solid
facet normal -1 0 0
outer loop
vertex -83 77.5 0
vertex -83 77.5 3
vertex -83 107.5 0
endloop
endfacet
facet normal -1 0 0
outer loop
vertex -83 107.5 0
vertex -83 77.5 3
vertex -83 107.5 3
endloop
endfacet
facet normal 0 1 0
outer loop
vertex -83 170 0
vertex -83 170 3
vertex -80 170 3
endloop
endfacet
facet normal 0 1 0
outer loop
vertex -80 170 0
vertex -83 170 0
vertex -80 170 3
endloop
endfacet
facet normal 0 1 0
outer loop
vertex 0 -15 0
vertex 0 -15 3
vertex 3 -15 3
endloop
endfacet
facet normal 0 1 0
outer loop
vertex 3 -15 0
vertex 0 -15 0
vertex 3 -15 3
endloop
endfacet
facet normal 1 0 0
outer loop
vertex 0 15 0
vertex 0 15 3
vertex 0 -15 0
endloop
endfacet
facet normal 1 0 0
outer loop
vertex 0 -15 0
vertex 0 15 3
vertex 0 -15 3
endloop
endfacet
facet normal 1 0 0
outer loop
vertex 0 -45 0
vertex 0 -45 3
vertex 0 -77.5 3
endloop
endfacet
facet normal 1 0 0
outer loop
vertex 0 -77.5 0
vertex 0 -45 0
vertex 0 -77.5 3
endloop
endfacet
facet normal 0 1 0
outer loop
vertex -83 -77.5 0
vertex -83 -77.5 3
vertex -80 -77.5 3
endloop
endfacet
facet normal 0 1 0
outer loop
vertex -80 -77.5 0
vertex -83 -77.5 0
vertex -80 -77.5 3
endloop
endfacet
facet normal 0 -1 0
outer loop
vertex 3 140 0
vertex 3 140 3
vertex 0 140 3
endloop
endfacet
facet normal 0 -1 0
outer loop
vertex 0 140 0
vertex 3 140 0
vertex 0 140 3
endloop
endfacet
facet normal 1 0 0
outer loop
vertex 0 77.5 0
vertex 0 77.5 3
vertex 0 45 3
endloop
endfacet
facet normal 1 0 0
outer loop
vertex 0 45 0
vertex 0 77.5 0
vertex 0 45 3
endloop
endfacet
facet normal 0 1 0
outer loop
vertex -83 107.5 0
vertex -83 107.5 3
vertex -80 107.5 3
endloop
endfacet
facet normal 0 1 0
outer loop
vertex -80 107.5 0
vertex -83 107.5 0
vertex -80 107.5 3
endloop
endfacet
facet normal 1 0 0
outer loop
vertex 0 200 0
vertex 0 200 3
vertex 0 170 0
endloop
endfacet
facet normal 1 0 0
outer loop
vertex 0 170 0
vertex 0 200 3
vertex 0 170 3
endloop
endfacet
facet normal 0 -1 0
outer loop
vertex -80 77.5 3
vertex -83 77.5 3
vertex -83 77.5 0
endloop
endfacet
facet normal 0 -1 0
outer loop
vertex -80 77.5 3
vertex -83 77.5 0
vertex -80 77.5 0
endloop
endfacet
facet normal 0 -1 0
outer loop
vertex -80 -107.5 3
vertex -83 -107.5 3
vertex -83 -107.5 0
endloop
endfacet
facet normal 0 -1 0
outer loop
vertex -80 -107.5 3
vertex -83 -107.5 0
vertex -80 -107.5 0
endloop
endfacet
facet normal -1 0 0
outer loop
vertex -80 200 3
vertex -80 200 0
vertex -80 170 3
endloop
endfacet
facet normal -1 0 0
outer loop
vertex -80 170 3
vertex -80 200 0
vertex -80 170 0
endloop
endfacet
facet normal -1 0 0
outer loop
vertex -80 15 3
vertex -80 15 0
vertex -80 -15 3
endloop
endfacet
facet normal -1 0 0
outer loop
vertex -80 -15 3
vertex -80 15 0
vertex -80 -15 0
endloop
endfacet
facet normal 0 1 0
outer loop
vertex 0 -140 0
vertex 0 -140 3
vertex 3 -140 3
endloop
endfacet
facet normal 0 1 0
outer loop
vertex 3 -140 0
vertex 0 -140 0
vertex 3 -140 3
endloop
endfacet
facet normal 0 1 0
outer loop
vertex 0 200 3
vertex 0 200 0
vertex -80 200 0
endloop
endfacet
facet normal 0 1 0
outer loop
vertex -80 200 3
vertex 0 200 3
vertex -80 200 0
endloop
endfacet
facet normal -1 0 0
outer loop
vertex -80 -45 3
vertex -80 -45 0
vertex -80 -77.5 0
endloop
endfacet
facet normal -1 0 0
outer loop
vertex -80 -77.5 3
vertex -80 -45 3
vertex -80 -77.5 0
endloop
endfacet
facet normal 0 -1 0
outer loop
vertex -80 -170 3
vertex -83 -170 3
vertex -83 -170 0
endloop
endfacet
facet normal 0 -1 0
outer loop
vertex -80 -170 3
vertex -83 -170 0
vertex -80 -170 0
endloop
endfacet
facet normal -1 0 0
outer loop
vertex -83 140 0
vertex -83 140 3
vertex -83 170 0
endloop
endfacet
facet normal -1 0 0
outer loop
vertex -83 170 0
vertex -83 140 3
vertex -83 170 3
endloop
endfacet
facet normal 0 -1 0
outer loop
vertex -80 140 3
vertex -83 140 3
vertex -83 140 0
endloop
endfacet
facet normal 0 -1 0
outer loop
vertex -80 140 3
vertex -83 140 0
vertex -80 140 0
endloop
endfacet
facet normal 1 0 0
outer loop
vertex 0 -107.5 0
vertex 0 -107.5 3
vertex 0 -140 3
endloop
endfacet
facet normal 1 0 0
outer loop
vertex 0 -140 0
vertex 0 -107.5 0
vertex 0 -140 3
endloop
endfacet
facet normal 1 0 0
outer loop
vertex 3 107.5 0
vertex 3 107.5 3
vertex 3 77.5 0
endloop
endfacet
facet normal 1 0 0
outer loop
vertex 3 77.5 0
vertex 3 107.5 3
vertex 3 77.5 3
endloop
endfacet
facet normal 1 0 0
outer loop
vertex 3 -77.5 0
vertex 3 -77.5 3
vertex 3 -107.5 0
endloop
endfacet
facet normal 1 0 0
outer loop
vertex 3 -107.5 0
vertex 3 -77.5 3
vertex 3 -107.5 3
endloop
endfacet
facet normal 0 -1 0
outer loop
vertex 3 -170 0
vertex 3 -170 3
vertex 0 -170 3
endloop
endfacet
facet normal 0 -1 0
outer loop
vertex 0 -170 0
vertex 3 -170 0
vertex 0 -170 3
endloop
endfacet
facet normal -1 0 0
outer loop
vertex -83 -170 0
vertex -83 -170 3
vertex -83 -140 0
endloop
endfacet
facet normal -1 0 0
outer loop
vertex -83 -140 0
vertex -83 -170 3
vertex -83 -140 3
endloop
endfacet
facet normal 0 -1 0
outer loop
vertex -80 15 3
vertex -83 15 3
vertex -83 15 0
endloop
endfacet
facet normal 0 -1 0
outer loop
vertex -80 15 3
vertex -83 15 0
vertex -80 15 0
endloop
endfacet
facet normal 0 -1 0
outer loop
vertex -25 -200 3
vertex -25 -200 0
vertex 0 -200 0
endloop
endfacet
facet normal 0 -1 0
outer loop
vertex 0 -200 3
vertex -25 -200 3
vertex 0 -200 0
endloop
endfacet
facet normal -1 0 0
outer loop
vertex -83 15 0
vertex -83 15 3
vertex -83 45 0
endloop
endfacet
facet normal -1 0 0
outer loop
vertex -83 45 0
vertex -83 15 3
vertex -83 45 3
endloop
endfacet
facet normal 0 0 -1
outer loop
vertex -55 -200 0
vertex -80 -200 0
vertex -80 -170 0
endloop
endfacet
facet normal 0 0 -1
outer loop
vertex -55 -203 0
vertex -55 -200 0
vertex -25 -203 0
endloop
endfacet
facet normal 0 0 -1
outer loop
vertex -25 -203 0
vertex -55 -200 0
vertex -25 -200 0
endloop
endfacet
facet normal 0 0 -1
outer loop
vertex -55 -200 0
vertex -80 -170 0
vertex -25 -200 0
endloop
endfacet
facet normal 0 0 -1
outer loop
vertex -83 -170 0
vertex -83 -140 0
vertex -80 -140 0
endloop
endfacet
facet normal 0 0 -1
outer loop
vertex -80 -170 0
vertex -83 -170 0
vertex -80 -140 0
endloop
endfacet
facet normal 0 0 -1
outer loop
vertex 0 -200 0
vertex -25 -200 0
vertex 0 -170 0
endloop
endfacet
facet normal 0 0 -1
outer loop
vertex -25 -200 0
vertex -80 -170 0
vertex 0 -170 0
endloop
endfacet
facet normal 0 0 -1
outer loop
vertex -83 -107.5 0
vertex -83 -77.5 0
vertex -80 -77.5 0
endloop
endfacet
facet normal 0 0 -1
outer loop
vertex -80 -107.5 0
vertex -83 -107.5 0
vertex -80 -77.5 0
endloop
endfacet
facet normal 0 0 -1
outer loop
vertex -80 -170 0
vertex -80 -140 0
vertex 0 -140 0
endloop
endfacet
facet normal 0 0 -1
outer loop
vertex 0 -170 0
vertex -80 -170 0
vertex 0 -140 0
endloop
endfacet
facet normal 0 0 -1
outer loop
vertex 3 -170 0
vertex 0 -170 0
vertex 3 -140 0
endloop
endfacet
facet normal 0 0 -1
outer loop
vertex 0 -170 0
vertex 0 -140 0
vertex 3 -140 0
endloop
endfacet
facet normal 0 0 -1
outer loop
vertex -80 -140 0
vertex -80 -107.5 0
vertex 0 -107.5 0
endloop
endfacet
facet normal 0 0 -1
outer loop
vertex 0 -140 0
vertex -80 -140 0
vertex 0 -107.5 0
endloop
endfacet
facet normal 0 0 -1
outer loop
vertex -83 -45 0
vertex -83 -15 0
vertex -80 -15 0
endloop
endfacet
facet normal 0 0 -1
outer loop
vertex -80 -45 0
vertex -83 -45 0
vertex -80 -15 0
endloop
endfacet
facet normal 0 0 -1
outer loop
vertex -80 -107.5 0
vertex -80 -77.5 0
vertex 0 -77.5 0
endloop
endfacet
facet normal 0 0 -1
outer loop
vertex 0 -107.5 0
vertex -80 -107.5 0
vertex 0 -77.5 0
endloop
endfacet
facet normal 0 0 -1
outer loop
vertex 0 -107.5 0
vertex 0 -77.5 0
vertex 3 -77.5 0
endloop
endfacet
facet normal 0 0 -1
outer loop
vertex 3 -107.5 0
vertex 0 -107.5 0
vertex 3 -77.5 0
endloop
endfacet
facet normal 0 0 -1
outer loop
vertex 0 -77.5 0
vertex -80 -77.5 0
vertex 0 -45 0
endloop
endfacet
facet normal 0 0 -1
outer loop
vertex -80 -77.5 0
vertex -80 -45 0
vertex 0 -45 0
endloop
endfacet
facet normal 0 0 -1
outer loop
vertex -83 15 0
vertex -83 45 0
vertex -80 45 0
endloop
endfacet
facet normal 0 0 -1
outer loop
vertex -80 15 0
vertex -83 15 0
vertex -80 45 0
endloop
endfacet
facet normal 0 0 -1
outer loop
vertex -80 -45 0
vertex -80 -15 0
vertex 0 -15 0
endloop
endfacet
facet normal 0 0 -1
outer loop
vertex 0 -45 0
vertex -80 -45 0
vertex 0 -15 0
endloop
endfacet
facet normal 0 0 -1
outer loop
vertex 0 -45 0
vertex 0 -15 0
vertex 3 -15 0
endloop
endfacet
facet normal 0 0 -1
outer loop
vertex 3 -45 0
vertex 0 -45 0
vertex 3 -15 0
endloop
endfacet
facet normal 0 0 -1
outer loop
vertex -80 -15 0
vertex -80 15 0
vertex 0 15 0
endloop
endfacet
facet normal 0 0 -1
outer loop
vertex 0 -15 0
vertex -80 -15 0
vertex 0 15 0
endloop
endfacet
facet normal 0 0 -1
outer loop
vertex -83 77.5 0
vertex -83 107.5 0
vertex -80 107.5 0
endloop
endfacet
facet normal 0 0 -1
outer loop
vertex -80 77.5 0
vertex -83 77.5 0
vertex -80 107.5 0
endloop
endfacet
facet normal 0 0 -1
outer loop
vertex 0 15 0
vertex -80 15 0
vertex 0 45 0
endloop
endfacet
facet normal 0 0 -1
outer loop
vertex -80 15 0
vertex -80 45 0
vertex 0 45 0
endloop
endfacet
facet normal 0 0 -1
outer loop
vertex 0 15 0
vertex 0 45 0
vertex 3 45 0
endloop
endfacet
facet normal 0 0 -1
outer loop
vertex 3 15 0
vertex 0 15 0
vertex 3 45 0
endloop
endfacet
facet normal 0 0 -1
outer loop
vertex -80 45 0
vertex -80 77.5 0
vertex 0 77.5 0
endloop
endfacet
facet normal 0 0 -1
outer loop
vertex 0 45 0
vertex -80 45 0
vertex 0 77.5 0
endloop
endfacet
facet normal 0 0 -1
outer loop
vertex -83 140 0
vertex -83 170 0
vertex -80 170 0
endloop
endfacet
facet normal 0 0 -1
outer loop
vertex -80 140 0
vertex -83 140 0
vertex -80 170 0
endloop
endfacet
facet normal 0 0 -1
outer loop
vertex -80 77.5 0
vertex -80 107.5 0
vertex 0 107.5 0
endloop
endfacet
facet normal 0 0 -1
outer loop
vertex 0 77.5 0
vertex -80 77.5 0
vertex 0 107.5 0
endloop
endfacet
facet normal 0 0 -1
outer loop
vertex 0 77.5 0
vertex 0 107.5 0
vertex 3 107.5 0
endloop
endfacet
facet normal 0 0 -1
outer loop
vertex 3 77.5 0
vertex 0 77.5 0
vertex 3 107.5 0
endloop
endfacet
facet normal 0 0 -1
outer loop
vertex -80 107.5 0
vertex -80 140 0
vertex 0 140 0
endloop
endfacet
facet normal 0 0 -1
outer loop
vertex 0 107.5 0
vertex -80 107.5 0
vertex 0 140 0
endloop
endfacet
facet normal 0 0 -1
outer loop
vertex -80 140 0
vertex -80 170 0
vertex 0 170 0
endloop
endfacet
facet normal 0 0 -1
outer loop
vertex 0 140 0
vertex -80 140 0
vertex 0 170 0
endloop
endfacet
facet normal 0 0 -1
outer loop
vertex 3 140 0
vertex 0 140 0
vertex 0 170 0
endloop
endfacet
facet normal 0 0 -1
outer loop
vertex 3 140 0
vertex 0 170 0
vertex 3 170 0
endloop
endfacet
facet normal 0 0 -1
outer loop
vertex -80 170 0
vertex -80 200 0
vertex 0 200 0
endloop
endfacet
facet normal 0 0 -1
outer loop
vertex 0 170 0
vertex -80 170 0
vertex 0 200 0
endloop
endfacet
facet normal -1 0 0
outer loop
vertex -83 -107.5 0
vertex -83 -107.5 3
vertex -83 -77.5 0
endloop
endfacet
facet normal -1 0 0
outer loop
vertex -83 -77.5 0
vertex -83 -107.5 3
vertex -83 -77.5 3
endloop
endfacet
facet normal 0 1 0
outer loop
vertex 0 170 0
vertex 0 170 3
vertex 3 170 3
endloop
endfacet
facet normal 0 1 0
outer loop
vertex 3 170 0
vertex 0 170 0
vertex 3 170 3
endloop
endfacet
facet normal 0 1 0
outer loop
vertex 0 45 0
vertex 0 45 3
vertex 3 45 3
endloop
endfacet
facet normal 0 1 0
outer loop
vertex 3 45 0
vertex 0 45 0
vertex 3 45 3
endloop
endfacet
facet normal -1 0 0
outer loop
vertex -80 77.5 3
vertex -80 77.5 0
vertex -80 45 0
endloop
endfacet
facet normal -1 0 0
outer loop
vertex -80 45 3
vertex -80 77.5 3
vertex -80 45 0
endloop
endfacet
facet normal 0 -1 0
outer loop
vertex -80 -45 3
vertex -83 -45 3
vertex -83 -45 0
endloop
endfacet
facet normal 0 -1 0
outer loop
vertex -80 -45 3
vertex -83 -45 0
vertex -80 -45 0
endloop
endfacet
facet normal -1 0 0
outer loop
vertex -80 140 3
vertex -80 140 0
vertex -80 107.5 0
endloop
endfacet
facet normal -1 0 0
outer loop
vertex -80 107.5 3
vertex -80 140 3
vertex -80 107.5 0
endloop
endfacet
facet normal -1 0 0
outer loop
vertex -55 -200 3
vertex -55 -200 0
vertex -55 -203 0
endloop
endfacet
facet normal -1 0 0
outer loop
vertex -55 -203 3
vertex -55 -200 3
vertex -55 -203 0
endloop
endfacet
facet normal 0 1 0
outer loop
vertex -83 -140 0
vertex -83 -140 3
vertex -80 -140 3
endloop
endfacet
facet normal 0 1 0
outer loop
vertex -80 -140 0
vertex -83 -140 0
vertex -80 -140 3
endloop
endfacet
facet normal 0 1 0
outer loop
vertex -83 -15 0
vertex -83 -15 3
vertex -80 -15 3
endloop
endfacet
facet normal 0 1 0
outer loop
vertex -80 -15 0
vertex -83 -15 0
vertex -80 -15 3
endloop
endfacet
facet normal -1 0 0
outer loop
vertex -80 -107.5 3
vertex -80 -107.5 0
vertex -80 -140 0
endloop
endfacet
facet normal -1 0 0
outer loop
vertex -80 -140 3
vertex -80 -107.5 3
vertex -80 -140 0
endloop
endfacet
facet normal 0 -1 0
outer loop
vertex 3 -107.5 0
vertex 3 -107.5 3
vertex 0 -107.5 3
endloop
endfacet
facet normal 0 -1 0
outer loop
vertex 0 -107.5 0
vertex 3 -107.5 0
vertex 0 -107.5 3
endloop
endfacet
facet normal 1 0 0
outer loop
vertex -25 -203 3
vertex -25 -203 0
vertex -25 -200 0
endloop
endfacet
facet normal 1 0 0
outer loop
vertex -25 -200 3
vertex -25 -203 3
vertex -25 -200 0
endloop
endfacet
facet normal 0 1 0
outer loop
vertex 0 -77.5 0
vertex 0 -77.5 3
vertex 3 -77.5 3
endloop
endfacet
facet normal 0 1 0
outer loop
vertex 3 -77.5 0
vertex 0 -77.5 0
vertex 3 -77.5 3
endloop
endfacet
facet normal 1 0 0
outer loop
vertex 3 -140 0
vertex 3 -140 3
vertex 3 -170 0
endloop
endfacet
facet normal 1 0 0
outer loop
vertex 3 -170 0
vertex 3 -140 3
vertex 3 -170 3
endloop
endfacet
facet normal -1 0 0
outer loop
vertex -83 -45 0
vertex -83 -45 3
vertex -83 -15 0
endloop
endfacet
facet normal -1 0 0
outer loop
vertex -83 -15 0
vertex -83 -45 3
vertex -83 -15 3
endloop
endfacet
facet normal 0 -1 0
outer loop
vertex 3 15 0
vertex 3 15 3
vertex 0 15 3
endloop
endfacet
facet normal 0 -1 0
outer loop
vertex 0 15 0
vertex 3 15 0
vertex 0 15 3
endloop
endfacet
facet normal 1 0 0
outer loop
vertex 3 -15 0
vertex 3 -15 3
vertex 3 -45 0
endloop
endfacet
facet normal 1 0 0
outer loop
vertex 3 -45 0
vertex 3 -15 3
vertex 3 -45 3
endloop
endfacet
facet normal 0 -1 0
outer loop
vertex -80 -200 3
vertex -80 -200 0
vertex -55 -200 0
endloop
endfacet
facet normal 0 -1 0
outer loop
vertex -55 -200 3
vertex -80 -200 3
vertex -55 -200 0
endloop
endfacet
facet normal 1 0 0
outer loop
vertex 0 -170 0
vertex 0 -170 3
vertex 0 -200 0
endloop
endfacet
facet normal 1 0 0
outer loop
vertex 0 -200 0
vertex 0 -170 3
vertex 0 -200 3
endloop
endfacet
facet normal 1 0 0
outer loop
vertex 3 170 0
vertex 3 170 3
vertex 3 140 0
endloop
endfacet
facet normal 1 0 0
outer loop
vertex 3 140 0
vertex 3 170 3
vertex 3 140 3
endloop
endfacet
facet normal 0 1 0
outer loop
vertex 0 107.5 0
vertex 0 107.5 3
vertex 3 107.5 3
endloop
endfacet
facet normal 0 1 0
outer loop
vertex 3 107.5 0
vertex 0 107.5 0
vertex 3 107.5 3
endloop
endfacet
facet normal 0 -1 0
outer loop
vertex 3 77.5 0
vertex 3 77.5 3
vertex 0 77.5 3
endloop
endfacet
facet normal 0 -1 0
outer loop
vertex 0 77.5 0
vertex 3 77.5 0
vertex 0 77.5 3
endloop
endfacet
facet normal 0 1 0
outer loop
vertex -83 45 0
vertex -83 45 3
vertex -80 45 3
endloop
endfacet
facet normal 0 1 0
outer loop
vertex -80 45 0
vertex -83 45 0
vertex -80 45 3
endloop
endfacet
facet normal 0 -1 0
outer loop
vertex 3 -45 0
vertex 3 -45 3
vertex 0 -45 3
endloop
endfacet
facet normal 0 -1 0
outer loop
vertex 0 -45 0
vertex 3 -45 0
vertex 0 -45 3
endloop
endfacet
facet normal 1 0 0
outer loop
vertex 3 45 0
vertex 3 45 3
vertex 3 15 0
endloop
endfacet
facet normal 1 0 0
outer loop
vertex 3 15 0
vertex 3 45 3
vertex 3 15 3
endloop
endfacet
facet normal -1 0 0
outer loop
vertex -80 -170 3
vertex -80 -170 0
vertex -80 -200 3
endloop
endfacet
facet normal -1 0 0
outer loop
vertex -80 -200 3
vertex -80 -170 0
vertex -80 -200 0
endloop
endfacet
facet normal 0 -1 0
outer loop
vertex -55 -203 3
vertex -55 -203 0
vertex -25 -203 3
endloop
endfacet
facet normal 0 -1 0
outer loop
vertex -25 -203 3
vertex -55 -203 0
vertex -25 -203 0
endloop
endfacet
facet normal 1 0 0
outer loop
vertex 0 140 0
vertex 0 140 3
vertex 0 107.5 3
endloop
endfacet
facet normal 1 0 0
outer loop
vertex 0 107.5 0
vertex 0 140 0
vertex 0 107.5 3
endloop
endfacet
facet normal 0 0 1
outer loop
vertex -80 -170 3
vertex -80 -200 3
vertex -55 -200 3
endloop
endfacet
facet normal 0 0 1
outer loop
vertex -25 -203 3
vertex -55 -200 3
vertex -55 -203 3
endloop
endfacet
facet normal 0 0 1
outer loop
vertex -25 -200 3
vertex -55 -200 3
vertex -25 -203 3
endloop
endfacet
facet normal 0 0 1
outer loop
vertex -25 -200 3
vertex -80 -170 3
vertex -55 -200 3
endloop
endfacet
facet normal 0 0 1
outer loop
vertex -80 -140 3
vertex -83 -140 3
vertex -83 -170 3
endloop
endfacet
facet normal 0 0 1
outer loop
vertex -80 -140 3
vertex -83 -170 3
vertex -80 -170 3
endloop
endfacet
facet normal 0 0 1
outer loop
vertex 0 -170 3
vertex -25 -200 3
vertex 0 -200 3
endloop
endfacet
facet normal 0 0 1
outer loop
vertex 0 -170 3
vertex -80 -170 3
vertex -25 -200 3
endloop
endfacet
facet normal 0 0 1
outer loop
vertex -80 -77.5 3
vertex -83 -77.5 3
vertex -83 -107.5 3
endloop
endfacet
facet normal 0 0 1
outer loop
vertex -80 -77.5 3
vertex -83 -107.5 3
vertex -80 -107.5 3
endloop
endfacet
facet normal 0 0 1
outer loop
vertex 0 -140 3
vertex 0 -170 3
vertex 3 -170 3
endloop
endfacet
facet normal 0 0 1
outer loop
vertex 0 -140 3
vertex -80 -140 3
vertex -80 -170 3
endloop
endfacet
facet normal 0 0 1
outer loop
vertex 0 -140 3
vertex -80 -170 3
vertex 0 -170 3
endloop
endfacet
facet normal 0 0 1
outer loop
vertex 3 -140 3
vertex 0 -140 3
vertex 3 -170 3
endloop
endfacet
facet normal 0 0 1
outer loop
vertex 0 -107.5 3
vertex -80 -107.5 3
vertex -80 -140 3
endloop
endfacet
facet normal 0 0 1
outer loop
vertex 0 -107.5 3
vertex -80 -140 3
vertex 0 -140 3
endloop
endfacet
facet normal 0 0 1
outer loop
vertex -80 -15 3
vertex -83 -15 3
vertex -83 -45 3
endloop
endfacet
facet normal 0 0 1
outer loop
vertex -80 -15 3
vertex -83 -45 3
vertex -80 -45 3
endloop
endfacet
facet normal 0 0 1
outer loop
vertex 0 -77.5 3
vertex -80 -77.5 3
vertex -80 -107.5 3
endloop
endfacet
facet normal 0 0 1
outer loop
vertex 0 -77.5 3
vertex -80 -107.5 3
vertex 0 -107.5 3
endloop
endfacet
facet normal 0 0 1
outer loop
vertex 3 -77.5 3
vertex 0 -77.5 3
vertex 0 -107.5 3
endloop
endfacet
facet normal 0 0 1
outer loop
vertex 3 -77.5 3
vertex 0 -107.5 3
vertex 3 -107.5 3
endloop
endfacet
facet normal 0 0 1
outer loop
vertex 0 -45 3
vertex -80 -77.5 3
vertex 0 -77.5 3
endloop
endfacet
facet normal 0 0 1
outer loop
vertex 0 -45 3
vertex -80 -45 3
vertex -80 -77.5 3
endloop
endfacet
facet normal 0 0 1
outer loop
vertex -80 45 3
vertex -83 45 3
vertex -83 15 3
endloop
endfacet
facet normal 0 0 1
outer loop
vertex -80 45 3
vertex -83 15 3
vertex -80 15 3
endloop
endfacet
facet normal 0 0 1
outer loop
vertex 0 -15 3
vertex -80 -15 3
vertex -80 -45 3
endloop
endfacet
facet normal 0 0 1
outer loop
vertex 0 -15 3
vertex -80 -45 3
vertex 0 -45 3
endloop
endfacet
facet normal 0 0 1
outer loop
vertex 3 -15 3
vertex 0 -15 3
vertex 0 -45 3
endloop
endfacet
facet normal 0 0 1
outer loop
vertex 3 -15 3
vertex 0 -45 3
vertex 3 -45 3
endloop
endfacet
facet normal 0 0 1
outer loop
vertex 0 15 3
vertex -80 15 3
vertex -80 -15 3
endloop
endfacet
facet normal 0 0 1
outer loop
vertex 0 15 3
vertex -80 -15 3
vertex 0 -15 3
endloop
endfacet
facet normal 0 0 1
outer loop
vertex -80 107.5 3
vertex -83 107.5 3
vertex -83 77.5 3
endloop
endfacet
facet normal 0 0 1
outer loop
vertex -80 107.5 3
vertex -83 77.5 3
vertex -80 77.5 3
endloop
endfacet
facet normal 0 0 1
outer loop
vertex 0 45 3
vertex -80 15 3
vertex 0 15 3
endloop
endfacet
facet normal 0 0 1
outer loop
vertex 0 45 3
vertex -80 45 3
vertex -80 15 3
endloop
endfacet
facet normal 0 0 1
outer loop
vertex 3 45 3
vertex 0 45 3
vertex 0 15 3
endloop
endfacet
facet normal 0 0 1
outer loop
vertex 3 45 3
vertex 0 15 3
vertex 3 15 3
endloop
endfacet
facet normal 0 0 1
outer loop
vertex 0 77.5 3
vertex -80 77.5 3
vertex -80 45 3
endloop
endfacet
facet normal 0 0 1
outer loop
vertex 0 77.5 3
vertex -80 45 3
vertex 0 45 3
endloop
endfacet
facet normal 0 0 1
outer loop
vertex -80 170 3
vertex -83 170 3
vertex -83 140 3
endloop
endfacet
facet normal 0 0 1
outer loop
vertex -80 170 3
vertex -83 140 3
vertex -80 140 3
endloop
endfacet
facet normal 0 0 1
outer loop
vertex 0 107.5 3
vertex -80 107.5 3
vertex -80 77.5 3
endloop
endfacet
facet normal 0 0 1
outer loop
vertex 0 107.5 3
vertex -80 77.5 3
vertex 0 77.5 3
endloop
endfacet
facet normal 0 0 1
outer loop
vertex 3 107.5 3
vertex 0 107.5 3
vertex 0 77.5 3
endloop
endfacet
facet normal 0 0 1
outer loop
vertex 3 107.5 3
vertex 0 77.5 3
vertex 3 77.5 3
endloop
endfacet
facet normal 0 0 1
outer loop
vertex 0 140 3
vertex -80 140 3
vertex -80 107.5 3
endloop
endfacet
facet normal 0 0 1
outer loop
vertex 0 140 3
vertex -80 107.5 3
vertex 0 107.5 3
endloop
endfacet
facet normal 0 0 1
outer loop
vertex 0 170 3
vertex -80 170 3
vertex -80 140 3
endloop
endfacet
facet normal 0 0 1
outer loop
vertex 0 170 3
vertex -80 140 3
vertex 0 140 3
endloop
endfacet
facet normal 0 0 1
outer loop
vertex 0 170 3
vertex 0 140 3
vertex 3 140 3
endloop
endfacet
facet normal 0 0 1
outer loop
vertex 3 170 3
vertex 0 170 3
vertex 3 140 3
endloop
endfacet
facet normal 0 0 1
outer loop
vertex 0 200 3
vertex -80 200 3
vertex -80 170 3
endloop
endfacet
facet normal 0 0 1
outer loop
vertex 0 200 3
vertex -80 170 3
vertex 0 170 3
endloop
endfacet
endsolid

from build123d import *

# Parameters (mm, degrees)
RESSALTO_EXTRUS_O1_DEPTH = 3
CORTE_EXTRUS_O3_DEPTH    = 219.215489826
ESBO_O4_W                = 3
ESBO_O4_H                = 30
RESSALTO_EXTRUS_O3_DEPTH = 3


with BuildPart() as part:
    # Esboço1 → Ressalto-extrusão1 (new body)
    with BuildSketch(Plane.XY):
        Polygon((-80, -200), (-55, -200), (-55, -203), (-25, -203), (-25, -200), (25, -200), (25, -203), (55, -203), (55, -200), (80, -200), (80, 200), (-80, 200), align=None)
    extrude(amount=RESSALTO_EXTRUS_O1_DEPTH)

    # Esboço2 → Corte-extrusão3 (cut, through all)
    with BuildSketch(Plane.XY.offset(3)):
        Polygon((0, 200), (0, 170), (3, 170), (3, 140), (0, 140), (0, 107.5), (3, 107.5), (3, 77.5), (0, 77.5), (0, 45), (3, 45), (3, 15), (0, 15), (0, -15), (3, -15), (3, -45), (0, -45), (0, -77.5), (3, -77.5), (3, -107.5), (0, -107.5), (0, -140), (3, -140), (3, -170), (0, -170), (0, -200), (25, -200), (25, -203), (55, -203), (55, -200), (80, -200), (80, 200), align=None)
    extrude(amount=-CORTE_EXTRUS_O3_DEPTH, mode=Mode.SUBTRACT)

    # Esboço4 → Ressalto-extrusão3 (add)
    with BuildSketch(Plane.XY.offset(3)):
        with Locations((-81.5, 155)):
            Rectangle(ESBO_O4_W, ESBO_O4_H)
        with Locations((-81.5, 92.5)):
            Rectangle(ESBO_O4_W, ESBO_O4_H)
        with Locations((-81.5, 30)):
            Rectangle(ESBO_O4_W, ESBO_O4_H)
        with Locations((-81.5, -30)):
            Rectangle(ESBO_O4_W, ESBO_O4_H)
        with Locations((-81.5, -92.5)):
            Rectangle(ESBO_O4_W, ESBO_O4_H)
        with Locations((-81.5, -155)):
            Rectangle(ESBO_O4_W, ESBO_O4_H)
    extrude(amount=-RESSALTO_EXTRUS_O3_DEPTH)


solid = part.part
